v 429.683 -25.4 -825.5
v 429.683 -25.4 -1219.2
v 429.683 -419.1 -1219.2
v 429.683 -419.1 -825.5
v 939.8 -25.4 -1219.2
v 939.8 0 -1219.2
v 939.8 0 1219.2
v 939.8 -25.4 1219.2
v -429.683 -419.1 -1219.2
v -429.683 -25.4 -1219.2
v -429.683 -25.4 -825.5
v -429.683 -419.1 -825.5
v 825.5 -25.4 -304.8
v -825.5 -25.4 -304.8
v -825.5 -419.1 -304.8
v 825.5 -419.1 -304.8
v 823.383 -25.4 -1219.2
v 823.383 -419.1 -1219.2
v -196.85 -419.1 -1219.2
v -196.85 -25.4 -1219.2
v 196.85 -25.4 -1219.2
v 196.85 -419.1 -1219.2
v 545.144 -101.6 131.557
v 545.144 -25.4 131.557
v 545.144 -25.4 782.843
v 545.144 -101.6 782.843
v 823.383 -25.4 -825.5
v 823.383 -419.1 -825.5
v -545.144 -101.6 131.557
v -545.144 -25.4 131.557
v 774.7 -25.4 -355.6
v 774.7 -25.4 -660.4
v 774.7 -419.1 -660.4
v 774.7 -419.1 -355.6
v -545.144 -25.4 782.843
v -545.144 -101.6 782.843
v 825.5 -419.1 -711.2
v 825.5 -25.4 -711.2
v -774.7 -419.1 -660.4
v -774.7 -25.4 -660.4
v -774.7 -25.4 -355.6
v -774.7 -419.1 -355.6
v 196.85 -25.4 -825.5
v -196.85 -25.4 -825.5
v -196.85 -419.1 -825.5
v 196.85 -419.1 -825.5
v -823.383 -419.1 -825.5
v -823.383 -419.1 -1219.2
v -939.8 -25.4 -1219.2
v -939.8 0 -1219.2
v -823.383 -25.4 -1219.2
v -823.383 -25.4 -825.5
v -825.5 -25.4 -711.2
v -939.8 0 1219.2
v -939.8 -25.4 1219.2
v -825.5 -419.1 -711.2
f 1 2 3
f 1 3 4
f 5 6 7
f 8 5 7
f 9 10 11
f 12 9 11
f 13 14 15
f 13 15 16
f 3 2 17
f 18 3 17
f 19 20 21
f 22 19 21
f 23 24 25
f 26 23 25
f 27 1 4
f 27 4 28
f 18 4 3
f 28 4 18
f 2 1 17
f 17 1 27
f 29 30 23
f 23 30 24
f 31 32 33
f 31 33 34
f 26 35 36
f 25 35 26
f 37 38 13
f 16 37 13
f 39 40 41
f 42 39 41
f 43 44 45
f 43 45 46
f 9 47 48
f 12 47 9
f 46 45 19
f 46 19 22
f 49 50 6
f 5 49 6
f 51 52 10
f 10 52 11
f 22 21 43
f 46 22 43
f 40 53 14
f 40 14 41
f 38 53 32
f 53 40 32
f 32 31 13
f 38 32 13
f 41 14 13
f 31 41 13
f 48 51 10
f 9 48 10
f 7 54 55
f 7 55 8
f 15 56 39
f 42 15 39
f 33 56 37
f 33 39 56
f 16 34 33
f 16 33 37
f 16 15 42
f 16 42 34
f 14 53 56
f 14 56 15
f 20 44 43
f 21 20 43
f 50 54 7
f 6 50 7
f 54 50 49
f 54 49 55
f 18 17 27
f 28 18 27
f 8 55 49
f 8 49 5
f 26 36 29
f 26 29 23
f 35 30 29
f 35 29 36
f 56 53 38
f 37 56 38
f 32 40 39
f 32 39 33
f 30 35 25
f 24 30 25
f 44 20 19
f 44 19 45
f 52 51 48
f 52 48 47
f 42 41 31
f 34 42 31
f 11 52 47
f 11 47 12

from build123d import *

# Parameters (mm, degrees)
F0_W     = 1879.6
F0_H     = 2438.4
F1_DEPTH = 25.4
F2_W     = 1090.2872387474
F2_H     = 651.2862174379
F3_DEPTH = 76.2
F2_W_2   = 393.7
F2_H_2   = 393.7
F4_DEPTH = 393.7
F2_W_3   = 1651
F2_H_3   = 406.4
F2_W_4   = 1549.4
F2_H_4   = 304.8
F5_DEPTH = 393.7


with BuildPart() as f1:
    # F0 (on Front) → F1 (new body)
    with BuildSketch(Plane.XZ):
        Rectangle(F0_W, F0_H)
    extrude(amount=F1_DEPTH)


with BuildPart() as f3:
    # F2 (on face) → F3 (new body)
    with BuildSketch(Plane.XZ.offset(25.4)):
        with Locations((0, 457.2)):
            Rectangle(F2_W, F2_H)
    extrude(amount=F3_DEPTH)


with BuildPart() as f4:
    # F2 (on face) → F4 (new body)
    with BuildSketch(Plane.XZ.offset(25.4)):
        with Locations((-626.5333333333, -1022.35)):
            Rectangle(F2_W_2, F2_H_2)
    extrude(amount=F4_DEPTH)


with BuildPart() as f4b:
    # F2 (on face) → F4, piece 2 (new body)
    with BuildSketch(Plane.XZ.offset(25.4)):
        with Locations((0, -1022.35)):
            Rectangle(F2_W_2, F2_H_2)
    extrude(amount=F4_DEPTH)


with BuildPart() as f4c:
    # F2 (on face) → F4, piece 3 (new body)
    with BuildSketch(Plane.XZ.offset(25.4)):
        with Locations((626.5333333333, -1022.35)):
            Rectangle(F2_W_2, F2_H_2)
    extrude(amount=F4_DEPTH)


with BuildPart() as f5:
    # F2 (on face) → F5 (new body)
    with BuildSketch(Plane.XZ.offset(25.4)):
        with Locations((0, -508)):
            Rectangle(F2_W_3, F2_H_3)
        with Locations((0, -508)):
            Rectangle(F2_W_4, F2_H_4, mode=Mode.SUBTRACT)
    extrude(amount=F5_DEPTH)


solid = Compound([f1.part, f3.part, f4.part, f4b.part, f4c.part, f5.part])
